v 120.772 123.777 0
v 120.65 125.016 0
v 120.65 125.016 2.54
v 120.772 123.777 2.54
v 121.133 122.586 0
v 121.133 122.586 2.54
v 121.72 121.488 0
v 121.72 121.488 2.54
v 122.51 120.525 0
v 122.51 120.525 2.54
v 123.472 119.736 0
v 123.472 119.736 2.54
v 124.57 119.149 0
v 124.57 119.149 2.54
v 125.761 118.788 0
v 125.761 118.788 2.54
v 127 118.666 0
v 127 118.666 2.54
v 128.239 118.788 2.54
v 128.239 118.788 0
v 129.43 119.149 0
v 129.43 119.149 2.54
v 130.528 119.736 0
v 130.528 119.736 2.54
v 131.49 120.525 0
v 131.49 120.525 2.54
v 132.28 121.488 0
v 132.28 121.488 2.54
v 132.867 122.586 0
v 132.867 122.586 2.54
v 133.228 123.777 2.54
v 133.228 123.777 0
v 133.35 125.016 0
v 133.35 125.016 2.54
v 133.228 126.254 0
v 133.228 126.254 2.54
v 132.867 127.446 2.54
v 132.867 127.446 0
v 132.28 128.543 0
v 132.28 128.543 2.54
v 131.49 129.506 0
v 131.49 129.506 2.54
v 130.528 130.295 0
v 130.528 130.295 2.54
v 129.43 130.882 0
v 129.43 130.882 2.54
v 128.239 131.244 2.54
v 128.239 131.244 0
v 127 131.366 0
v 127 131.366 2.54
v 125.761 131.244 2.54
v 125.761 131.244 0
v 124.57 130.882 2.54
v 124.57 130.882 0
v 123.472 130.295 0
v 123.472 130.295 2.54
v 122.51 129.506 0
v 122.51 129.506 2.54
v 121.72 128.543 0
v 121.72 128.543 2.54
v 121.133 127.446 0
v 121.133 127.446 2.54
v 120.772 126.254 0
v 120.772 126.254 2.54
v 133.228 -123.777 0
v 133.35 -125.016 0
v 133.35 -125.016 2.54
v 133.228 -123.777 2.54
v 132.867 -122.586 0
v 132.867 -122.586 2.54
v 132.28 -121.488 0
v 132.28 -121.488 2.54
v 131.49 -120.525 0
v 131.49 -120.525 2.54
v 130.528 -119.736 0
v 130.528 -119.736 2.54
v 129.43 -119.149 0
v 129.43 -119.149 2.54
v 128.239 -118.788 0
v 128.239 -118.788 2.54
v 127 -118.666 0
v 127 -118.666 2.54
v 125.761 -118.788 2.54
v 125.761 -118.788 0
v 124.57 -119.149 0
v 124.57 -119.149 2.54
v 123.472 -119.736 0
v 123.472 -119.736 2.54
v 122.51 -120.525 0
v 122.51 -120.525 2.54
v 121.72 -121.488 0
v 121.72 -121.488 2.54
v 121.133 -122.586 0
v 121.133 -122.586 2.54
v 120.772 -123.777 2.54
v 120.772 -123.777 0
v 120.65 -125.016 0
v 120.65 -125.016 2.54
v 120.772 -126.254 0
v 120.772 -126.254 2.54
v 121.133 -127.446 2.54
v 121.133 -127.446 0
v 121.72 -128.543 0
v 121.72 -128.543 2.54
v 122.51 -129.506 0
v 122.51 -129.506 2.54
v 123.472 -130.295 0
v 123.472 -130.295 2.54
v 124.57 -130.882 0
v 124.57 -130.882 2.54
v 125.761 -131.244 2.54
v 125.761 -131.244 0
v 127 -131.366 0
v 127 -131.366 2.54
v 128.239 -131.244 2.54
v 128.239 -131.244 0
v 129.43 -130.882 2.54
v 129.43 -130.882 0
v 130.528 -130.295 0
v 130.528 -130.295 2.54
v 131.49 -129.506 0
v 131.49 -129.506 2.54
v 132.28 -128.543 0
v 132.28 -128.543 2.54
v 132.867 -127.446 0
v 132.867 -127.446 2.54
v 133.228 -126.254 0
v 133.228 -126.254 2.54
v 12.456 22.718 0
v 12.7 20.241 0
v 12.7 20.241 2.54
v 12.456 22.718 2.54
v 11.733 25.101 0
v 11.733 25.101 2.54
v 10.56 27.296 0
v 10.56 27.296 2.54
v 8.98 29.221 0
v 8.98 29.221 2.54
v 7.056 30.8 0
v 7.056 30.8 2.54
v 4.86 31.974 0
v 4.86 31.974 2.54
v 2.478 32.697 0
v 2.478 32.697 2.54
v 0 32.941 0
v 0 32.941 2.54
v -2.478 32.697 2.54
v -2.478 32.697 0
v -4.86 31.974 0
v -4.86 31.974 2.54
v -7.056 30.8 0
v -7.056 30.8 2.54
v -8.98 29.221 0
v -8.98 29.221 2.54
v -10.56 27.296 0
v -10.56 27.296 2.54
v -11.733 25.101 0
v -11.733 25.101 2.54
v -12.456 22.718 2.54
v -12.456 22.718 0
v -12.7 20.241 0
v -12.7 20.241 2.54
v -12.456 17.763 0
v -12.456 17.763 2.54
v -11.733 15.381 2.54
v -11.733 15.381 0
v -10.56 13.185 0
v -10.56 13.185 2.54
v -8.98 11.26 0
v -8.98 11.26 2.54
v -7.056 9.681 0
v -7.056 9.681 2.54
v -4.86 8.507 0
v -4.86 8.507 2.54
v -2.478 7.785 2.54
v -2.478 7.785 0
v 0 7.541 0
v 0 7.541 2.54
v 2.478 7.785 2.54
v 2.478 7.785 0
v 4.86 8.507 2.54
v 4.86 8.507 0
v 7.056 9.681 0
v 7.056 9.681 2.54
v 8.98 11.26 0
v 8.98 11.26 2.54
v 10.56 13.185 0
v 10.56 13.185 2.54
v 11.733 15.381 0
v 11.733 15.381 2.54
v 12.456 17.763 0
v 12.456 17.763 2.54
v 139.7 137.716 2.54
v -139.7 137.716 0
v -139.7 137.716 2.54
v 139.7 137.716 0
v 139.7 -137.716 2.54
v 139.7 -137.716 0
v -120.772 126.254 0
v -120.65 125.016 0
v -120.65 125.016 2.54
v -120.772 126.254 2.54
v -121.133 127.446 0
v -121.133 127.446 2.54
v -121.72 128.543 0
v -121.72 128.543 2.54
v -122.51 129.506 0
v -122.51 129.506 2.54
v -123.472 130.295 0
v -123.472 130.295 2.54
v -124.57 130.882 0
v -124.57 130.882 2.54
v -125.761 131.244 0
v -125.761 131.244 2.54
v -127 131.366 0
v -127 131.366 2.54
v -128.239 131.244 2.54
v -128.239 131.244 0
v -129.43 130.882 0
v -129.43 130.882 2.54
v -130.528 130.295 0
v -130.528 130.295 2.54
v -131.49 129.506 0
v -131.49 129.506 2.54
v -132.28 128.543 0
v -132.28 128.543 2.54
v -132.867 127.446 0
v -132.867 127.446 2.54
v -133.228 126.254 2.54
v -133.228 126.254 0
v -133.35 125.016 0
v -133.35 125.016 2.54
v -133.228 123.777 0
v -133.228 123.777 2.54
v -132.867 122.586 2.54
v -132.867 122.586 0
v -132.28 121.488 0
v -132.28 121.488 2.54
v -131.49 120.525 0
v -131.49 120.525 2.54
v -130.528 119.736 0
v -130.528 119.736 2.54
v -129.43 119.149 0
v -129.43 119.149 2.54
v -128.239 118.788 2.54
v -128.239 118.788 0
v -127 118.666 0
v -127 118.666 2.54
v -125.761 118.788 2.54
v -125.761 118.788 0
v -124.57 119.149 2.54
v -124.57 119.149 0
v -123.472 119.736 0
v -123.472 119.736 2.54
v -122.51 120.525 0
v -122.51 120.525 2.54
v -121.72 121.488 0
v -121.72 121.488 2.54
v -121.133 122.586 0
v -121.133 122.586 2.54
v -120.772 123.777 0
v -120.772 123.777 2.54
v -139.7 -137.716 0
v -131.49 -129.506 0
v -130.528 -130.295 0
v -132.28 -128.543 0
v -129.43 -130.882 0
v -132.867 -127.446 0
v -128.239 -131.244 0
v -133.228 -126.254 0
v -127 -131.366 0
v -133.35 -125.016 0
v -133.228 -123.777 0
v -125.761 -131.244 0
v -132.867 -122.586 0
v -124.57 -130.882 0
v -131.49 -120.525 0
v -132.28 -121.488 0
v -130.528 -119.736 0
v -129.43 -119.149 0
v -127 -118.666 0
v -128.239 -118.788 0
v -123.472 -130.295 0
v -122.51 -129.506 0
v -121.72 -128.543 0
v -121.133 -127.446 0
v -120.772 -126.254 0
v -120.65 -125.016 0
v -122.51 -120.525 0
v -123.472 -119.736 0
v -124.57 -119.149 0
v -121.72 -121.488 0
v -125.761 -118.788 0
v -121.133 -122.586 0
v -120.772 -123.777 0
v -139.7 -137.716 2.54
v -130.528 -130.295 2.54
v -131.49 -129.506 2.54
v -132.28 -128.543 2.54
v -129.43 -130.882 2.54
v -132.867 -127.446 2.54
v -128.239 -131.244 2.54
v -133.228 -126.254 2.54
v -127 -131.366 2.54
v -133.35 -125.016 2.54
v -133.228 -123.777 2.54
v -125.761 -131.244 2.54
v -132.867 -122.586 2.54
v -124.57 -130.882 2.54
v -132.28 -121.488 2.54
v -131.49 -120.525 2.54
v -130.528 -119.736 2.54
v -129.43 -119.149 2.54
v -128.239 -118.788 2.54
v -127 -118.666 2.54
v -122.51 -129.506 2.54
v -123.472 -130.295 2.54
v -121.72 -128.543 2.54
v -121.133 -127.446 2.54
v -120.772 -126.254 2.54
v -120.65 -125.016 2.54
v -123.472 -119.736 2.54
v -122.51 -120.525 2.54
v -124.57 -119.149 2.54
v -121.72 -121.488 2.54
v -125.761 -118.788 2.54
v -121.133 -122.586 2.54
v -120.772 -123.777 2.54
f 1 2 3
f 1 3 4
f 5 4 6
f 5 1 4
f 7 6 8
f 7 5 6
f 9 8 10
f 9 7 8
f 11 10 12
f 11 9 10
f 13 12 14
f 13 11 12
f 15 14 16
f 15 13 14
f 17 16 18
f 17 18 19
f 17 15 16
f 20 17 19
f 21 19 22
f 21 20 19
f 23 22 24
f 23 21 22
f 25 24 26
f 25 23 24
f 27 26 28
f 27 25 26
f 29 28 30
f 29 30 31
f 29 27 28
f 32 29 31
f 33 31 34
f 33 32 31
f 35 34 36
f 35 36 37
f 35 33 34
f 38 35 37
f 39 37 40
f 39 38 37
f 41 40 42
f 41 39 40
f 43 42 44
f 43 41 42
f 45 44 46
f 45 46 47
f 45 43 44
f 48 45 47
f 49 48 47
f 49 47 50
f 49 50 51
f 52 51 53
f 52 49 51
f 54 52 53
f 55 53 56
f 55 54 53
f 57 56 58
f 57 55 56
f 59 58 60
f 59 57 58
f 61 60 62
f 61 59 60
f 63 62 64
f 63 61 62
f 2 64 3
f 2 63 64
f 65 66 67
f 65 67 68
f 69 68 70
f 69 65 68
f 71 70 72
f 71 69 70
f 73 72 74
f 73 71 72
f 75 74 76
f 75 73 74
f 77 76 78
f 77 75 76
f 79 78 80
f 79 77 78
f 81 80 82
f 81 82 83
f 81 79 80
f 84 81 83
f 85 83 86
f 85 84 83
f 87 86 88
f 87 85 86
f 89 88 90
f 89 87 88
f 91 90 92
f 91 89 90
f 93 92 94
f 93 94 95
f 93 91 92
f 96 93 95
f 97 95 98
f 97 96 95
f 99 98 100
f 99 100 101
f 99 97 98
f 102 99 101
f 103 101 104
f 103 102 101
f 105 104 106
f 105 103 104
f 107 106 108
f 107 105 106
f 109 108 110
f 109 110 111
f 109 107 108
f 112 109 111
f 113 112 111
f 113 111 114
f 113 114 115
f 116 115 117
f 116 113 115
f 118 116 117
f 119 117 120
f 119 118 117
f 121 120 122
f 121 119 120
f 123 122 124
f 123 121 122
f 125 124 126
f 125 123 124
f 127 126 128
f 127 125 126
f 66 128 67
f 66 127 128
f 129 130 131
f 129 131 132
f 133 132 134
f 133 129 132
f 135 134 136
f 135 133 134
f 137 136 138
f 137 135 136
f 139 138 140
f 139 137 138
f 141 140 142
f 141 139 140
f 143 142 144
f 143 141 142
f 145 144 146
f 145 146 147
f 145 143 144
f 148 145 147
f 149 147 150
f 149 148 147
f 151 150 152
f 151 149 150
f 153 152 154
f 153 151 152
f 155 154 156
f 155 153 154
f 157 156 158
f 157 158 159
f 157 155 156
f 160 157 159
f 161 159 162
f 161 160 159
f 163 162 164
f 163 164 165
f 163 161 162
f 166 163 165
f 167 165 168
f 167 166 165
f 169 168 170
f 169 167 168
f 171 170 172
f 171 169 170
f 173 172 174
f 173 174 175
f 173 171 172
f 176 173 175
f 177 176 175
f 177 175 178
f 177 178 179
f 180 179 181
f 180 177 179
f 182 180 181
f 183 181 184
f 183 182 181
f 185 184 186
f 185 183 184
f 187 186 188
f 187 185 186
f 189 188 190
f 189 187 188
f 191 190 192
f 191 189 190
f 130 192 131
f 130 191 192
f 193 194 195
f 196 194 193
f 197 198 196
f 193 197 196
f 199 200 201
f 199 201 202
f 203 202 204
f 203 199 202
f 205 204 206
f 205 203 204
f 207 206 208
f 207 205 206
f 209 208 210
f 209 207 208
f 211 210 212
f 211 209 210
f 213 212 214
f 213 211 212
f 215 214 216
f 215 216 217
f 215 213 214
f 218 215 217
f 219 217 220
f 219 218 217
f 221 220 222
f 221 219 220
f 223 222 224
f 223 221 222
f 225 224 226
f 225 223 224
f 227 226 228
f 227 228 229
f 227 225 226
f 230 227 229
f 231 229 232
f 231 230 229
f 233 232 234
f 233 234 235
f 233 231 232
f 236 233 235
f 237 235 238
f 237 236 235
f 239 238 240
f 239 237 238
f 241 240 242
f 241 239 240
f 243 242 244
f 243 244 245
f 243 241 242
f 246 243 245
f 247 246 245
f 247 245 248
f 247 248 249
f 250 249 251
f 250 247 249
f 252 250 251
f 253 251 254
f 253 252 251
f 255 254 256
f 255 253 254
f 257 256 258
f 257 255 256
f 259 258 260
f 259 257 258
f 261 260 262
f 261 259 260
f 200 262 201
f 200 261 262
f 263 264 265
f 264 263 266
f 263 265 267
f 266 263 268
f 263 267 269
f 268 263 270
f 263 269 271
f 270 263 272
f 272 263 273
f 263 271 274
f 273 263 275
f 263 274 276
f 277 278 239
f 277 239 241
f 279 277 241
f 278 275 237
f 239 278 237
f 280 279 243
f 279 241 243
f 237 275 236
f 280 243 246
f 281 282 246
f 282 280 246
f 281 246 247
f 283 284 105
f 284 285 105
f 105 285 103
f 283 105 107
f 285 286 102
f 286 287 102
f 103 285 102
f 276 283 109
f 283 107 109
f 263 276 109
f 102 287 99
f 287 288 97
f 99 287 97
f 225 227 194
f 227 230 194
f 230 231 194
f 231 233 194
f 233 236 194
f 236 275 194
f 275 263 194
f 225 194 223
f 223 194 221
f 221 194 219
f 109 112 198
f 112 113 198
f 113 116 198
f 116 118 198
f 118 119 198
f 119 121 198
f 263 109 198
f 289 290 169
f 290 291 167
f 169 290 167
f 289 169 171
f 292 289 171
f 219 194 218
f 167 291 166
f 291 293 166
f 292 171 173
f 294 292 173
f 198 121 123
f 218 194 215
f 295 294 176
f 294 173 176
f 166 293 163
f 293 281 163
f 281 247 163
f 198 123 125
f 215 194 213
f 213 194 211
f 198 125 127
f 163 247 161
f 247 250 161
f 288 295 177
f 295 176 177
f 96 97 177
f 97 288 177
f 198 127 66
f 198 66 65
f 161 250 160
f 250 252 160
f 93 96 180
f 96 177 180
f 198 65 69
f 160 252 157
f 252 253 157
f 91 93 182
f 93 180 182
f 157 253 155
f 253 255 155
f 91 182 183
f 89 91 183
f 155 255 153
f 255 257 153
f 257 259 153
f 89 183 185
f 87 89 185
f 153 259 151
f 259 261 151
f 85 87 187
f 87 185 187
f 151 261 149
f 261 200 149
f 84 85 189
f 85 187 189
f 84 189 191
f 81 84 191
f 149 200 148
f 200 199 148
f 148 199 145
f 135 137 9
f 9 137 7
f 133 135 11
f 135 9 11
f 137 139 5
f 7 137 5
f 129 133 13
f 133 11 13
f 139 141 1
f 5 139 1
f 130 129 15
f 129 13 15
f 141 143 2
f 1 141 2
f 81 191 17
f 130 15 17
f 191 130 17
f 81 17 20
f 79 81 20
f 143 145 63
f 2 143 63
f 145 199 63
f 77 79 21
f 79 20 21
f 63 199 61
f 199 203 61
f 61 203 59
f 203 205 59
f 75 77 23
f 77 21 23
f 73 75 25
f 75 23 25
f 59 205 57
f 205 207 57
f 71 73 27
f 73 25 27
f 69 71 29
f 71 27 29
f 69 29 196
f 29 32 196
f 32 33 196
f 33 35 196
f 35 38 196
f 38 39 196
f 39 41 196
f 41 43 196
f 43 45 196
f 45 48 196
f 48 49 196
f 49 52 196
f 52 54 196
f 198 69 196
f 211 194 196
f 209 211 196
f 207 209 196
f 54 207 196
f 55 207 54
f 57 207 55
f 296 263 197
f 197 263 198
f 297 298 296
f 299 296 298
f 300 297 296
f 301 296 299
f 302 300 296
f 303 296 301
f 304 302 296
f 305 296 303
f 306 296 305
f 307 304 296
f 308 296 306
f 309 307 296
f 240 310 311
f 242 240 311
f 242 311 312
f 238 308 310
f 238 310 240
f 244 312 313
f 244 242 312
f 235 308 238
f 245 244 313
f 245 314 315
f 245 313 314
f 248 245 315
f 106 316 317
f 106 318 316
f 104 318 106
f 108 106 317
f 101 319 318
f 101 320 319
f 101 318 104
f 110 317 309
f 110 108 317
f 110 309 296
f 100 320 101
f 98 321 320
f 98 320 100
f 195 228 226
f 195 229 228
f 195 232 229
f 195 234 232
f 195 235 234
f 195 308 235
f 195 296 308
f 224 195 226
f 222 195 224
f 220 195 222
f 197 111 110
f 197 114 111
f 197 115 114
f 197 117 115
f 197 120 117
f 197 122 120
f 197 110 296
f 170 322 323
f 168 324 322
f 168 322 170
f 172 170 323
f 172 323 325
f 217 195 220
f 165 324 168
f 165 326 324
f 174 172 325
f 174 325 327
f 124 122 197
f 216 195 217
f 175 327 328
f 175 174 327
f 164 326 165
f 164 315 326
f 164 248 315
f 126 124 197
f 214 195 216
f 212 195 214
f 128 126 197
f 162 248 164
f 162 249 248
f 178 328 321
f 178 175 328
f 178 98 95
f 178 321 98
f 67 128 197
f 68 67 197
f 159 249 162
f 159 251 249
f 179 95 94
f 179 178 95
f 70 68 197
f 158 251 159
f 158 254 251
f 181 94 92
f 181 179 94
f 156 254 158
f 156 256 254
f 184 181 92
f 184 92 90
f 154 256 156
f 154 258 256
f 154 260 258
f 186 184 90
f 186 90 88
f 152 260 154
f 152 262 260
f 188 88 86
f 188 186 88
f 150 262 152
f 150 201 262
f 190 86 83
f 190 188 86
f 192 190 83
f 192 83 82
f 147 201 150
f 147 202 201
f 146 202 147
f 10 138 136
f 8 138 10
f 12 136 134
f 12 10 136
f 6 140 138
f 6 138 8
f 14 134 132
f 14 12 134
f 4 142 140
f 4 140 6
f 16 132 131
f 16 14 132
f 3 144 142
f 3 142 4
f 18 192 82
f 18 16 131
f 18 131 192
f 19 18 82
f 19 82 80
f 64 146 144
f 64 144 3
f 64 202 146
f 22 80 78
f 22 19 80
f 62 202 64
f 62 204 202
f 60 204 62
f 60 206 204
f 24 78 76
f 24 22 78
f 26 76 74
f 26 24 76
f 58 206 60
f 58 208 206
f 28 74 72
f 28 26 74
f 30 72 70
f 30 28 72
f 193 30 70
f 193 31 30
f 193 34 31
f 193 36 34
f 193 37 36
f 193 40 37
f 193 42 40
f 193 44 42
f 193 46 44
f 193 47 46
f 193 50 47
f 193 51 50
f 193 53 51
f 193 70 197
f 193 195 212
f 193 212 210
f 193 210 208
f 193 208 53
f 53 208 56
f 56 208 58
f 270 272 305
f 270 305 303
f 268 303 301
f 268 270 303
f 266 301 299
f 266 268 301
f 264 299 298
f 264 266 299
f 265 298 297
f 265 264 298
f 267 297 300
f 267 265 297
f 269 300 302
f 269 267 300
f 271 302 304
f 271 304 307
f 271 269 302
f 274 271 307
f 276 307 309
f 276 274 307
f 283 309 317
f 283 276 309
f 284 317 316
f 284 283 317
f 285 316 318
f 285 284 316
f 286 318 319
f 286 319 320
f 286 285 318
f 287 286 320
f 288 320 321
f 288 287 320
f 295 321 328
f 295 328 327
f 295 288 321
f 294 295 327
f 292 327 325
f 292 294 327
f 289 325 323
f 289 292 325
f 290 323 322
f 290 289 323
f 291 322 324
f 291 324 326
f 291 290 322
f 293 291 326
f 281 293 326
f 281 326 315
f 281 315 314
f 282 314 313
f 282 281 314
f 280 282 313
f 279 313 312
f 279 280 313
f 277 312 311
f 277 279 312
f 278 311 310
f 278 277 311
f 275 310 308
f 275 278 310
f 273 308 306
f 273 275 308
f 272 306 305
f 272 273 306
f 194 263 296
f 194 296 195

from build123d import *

# Parameters (mm, degrees)
SKETCH1_W           = 279.4
SKETCH1_H           = 275.43125
SKETCH1_R           = 6.35
SKETCH1_R_2         = 12.7
BOSS_EXTRUDE1_DEPTH = 2.54


with BuildPart() as part:
    # Sketch1 → Boss-Extrude1 (new body)
    with BuildSketch(Plane.XY):
        Rectangle(SKETCH1_W, SKETCH1_H)
        with Locations((-127, 125.015625)):
            Circle(SKETCH1_R, mode=Mode.SUBTRACT)
        with Locations(Location((-127, -125.015625, 0), (0, 0, 180))):
            Circle(SKETCH1_R, mode=Mode.SUBTRACT)
        with Locations((127, -125.015625)):
            Circle(SKETCH1_R, mode=Mode.SUBTRACT)
        with Locations(Location((127, 125.015625, 0), (0, 0, 180))):
            Circle(SKETCH1_R, mode=Mode.SUBTRACT)
        with Locations((0, 20.240625)):
            Circle(SKETCH1_R_2, mode=Mode.SUBTRACT)
    extrude(amount=BOSS_EXTRUDE1_DEPTH)


solid = part.part
